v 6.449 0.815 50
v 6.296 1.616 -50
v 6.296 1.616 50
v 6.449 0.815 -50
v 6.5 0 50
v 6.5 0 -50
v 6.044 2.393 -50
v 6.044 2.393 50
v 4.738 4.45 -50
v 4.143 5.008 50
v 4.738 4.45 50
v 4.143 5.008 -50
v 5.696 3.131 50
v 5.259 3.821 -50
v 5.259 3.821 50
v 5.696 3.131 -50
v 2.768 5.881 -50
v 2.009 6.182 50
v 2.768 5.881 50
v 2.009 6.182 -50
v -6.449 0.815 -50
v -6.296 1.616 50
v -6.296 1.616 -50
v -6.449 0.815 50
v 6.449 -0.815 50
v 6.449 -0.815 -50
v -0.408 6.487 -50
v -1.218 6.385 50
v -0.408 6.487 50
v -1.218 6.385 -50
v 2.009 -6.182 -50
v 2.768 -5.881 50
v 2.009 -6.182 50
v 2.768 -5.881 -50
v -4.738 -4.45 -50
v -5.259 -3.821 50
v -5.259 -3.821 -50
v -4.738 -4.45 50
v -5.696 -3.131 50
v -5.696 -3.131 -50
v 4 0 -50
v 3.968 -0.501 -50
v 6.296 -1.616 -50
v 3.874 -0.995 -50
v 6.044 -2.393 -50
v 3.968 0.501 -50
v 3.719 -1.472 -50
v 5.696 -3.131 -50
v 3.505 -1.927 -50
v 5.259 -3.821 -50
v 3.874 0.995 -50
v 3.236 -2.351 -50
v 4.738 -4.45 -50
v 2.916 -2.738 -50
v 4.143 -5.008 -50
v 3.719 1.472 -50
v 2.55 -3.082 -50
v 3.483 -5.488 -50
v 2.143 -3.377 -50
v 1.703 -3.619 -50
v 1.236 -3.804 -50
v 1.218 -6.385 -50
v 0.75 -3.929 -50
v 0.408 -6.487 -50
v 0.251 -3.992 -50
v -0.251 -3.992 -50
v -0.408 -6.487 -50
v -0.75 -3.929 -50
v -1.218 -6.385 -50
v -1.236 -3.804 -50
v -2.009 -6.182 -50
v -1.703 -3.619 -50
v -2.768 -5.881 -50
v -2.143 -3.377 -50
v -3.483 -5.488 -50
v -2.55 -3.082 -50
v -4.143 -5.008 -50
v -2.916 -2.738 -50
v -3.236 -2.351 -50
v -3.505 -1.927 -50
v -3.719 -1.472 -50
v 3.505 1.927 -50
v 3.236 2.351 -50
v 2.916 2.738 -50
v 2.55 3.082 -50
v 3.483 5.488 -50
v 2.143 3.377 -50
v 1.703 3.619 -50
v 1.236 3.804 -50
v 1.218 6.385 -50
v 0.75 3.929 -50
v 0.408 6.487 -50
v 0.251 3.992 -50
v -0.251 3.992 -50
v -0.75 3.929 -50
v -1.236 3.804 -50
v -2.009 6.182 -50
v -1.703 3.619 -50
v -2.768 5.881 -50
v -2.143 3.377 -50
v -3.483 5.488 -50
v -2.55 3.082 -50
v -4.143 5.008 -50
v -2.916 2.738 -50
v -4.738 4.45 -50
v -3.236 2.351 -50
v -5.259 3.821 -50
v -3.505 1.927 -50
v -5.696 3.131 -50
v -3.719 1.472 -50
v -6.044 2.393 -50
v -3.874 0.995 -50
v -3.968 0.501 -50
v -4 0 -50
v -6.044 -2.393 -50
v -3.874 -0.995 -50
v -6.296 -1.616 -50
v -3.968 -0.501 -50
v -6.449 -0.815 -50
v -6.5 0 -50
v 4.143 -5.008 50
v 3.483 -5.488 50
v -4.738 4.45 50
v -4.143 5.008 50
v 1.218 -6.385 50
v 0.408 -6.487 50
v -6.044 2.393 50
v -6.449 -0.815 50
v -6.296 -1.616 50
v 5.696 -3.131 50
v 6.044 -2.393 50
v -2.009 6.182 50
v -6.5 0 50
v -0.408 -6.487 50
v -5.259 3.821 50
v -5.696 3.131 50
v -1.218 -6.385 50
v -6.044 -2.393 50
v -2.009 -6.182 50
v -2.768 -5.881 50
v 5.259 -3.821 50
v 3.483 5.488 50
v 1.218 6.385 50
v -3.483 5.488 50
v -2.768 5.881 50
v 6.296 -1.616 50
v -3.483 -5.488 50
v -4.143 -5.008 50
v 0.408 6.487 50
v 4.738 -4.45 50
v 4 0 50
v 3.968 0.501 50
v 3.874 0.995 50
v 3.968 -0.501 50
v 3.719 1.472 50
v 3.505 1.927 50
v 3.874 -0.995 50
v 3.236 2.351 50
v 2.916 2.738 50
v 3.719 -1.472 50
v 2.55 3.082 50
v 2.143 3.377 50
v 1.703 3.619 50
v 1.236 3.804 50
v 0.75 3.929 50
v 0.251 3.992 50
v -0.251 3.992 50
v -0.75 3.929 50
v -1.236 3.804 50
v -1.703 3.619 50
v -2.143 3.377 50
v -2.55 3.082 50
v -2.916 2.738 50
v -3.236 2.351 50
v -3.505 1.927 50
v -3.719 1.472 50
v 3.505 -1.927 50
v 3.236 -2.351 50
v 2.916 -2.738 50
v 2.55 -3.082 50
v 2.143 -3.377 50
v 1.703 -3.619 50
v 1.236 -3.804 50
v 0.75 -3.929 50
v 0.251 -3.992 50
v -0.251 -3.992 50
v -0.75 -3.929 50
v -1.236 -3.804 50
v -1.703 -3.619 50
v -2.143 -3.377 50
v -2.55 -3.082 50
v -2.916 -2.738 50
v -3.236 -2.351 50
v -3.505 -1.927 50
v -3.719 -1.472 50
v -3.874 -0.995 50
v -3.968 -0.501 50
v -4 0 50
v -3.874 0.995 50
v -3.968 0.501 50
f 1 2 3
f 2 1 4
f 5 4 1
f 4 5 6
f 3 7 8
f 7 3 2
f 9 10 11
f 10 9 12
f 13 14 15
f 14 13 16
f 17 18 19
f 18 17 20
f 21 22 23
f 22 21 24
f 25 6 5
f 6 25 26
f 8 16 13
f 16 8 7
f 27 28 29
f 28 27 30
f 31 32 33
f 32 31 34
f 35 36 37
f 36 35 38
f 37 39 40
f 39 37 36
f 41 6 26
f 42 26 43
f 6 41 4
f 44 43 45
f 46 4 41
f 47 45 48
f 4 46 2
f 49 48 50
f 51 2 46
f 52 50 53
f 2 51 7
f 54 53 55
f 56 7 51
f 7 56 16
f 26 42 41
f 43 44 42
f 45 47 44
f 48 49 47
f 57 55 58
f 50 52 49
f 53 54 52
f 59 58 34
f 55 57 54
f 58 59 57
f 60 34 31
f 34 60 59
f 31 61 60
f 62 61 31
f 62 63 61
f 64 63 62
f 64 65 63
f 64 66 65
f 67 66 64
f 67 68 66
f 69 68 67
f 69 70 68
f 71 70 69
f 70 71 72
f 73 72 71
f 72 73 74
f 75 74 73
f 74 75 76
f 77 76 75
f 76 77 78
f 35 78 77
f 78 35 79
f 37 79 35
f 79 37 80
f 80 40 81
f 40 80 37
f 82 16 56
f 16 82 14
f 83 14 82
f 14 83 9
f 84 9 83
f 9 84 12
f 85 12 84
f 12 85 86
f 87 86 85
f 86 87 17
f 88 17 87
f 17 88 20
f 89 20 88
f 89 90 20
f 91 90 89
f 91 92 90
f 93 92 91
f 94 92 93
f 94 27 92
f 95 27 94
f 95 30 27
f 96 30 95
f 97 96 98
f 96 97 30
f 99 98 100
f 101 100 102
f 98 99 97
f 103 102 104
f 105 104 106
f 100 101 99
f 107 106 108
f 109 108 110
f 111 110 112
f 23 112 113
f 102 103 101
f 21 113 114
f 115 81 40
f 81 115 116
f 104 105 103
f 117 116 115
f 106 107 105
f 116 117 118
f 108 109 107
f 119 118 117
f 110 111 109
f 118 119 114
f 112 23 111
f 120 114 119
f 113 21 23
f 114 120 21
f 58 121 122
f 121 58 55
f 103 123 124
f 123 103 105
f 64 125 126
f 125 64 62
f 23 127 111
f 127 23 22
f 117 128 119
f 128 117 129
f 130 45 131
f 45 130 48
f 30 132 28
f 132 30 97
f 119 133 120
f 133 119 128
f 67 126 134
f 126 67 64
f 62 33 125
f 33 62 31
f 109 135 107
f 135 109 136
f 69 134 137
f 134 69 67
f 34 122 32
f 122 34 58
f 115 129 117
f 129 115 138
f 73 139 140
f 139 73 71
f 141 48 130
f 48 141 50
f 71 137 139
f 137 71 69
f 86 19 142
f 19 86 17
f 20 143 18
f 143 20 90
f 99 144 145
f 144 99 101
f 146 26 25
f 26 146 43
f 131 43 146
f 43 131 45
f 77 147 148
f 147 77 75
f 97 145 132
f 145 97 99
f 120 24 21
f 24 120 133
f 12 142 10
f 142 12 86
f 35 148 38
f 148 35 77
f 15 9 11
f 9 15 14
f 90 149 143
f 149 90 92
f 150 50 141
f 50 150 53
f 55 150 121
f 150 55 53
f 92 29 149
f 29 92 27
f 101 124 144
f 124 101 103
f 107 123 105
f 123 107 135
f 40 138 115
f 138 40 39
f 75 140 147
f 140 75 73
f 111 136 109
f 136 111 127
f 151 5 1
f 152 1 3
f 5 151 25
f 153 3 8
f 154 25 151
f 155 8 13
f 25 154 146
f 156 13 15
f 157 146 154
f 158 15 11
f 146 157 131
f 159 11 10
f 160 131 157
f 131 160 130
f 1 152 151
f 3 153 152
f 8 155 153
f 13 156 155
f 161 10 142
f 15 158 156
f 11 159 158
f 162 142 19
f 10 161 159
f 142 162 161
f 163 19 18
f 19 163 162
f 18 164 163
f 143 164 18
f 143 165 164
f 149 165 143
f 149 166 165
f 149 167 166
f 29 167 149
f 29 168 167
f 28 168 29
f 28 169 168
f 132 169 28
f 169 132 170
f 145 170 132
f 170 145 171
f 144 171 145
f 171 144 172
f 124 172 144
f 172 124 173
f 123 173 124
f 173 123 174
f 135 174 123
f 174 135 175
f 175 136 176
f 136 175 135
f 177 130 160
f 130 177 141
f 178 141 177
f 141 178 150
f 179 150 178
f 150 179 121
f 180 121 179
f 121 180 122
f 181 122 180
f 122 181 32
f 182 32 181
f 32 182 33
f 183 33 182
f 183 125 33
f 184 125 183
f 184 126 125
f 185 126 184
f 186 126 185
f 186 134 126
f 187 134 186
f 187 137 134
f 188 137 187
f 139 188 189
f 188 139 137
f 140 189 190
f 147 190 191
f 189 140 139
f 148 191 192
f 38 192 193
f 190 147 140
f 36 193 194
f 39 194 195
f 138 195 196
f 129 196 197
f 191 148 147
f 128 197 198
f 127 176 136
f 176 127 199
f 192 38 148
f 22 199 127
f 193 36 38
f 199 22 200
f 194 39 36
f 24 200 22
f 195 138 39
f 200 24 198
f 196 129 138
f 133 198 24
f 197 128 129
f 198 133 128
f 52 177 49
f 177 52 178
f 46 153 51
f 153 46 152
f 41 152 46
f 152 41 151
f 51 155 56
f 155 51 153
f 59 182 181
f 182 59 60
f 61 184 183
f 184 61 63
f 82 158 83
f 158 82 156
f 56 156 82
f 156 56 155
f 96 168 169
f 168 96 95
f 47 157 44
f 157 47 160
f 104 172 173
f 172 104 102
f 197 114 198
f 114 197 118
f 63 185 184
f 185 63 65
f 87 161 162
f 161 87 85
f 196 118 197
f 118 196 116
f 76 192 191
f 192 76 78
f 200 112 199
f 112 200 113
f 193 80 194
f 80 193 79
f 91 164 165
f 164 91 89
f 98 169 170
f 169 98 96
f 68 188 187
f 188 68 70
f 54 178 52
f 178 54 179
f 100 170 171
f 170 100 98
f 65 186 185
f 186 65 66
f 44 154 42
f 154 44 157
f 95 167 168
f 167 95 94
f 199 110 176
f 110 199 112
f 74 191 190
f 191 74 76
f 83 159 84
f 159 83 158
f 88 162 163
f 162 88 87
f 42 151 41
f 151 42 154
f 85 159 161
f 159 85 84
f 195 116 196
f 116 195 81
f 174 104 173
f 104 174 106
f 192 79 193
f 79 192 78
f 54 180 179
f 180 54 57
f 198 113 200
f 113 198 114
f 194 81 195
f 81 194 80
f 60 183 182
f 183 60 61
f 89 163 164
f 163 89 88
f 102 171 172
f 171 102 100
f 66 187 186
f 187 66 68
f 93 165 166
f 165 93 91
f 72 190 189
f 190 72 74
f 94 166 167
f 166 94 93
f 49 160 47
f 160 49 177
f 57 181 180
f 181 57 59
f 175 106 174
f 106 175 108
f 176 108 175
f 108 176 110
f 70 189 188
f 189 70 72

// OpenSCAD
$fn = 50;


difference() {
	union() {
		translate(v = [0, 0, -50.0000000000]) {
			cylinder(h = 100, r = 6.5000000000);
		}
	}
	union() {
		translate(v = [0, 0, -100.0000000000]) {
			cylinder(h = 200, r = 4.0000000000);
		}
	}
}
